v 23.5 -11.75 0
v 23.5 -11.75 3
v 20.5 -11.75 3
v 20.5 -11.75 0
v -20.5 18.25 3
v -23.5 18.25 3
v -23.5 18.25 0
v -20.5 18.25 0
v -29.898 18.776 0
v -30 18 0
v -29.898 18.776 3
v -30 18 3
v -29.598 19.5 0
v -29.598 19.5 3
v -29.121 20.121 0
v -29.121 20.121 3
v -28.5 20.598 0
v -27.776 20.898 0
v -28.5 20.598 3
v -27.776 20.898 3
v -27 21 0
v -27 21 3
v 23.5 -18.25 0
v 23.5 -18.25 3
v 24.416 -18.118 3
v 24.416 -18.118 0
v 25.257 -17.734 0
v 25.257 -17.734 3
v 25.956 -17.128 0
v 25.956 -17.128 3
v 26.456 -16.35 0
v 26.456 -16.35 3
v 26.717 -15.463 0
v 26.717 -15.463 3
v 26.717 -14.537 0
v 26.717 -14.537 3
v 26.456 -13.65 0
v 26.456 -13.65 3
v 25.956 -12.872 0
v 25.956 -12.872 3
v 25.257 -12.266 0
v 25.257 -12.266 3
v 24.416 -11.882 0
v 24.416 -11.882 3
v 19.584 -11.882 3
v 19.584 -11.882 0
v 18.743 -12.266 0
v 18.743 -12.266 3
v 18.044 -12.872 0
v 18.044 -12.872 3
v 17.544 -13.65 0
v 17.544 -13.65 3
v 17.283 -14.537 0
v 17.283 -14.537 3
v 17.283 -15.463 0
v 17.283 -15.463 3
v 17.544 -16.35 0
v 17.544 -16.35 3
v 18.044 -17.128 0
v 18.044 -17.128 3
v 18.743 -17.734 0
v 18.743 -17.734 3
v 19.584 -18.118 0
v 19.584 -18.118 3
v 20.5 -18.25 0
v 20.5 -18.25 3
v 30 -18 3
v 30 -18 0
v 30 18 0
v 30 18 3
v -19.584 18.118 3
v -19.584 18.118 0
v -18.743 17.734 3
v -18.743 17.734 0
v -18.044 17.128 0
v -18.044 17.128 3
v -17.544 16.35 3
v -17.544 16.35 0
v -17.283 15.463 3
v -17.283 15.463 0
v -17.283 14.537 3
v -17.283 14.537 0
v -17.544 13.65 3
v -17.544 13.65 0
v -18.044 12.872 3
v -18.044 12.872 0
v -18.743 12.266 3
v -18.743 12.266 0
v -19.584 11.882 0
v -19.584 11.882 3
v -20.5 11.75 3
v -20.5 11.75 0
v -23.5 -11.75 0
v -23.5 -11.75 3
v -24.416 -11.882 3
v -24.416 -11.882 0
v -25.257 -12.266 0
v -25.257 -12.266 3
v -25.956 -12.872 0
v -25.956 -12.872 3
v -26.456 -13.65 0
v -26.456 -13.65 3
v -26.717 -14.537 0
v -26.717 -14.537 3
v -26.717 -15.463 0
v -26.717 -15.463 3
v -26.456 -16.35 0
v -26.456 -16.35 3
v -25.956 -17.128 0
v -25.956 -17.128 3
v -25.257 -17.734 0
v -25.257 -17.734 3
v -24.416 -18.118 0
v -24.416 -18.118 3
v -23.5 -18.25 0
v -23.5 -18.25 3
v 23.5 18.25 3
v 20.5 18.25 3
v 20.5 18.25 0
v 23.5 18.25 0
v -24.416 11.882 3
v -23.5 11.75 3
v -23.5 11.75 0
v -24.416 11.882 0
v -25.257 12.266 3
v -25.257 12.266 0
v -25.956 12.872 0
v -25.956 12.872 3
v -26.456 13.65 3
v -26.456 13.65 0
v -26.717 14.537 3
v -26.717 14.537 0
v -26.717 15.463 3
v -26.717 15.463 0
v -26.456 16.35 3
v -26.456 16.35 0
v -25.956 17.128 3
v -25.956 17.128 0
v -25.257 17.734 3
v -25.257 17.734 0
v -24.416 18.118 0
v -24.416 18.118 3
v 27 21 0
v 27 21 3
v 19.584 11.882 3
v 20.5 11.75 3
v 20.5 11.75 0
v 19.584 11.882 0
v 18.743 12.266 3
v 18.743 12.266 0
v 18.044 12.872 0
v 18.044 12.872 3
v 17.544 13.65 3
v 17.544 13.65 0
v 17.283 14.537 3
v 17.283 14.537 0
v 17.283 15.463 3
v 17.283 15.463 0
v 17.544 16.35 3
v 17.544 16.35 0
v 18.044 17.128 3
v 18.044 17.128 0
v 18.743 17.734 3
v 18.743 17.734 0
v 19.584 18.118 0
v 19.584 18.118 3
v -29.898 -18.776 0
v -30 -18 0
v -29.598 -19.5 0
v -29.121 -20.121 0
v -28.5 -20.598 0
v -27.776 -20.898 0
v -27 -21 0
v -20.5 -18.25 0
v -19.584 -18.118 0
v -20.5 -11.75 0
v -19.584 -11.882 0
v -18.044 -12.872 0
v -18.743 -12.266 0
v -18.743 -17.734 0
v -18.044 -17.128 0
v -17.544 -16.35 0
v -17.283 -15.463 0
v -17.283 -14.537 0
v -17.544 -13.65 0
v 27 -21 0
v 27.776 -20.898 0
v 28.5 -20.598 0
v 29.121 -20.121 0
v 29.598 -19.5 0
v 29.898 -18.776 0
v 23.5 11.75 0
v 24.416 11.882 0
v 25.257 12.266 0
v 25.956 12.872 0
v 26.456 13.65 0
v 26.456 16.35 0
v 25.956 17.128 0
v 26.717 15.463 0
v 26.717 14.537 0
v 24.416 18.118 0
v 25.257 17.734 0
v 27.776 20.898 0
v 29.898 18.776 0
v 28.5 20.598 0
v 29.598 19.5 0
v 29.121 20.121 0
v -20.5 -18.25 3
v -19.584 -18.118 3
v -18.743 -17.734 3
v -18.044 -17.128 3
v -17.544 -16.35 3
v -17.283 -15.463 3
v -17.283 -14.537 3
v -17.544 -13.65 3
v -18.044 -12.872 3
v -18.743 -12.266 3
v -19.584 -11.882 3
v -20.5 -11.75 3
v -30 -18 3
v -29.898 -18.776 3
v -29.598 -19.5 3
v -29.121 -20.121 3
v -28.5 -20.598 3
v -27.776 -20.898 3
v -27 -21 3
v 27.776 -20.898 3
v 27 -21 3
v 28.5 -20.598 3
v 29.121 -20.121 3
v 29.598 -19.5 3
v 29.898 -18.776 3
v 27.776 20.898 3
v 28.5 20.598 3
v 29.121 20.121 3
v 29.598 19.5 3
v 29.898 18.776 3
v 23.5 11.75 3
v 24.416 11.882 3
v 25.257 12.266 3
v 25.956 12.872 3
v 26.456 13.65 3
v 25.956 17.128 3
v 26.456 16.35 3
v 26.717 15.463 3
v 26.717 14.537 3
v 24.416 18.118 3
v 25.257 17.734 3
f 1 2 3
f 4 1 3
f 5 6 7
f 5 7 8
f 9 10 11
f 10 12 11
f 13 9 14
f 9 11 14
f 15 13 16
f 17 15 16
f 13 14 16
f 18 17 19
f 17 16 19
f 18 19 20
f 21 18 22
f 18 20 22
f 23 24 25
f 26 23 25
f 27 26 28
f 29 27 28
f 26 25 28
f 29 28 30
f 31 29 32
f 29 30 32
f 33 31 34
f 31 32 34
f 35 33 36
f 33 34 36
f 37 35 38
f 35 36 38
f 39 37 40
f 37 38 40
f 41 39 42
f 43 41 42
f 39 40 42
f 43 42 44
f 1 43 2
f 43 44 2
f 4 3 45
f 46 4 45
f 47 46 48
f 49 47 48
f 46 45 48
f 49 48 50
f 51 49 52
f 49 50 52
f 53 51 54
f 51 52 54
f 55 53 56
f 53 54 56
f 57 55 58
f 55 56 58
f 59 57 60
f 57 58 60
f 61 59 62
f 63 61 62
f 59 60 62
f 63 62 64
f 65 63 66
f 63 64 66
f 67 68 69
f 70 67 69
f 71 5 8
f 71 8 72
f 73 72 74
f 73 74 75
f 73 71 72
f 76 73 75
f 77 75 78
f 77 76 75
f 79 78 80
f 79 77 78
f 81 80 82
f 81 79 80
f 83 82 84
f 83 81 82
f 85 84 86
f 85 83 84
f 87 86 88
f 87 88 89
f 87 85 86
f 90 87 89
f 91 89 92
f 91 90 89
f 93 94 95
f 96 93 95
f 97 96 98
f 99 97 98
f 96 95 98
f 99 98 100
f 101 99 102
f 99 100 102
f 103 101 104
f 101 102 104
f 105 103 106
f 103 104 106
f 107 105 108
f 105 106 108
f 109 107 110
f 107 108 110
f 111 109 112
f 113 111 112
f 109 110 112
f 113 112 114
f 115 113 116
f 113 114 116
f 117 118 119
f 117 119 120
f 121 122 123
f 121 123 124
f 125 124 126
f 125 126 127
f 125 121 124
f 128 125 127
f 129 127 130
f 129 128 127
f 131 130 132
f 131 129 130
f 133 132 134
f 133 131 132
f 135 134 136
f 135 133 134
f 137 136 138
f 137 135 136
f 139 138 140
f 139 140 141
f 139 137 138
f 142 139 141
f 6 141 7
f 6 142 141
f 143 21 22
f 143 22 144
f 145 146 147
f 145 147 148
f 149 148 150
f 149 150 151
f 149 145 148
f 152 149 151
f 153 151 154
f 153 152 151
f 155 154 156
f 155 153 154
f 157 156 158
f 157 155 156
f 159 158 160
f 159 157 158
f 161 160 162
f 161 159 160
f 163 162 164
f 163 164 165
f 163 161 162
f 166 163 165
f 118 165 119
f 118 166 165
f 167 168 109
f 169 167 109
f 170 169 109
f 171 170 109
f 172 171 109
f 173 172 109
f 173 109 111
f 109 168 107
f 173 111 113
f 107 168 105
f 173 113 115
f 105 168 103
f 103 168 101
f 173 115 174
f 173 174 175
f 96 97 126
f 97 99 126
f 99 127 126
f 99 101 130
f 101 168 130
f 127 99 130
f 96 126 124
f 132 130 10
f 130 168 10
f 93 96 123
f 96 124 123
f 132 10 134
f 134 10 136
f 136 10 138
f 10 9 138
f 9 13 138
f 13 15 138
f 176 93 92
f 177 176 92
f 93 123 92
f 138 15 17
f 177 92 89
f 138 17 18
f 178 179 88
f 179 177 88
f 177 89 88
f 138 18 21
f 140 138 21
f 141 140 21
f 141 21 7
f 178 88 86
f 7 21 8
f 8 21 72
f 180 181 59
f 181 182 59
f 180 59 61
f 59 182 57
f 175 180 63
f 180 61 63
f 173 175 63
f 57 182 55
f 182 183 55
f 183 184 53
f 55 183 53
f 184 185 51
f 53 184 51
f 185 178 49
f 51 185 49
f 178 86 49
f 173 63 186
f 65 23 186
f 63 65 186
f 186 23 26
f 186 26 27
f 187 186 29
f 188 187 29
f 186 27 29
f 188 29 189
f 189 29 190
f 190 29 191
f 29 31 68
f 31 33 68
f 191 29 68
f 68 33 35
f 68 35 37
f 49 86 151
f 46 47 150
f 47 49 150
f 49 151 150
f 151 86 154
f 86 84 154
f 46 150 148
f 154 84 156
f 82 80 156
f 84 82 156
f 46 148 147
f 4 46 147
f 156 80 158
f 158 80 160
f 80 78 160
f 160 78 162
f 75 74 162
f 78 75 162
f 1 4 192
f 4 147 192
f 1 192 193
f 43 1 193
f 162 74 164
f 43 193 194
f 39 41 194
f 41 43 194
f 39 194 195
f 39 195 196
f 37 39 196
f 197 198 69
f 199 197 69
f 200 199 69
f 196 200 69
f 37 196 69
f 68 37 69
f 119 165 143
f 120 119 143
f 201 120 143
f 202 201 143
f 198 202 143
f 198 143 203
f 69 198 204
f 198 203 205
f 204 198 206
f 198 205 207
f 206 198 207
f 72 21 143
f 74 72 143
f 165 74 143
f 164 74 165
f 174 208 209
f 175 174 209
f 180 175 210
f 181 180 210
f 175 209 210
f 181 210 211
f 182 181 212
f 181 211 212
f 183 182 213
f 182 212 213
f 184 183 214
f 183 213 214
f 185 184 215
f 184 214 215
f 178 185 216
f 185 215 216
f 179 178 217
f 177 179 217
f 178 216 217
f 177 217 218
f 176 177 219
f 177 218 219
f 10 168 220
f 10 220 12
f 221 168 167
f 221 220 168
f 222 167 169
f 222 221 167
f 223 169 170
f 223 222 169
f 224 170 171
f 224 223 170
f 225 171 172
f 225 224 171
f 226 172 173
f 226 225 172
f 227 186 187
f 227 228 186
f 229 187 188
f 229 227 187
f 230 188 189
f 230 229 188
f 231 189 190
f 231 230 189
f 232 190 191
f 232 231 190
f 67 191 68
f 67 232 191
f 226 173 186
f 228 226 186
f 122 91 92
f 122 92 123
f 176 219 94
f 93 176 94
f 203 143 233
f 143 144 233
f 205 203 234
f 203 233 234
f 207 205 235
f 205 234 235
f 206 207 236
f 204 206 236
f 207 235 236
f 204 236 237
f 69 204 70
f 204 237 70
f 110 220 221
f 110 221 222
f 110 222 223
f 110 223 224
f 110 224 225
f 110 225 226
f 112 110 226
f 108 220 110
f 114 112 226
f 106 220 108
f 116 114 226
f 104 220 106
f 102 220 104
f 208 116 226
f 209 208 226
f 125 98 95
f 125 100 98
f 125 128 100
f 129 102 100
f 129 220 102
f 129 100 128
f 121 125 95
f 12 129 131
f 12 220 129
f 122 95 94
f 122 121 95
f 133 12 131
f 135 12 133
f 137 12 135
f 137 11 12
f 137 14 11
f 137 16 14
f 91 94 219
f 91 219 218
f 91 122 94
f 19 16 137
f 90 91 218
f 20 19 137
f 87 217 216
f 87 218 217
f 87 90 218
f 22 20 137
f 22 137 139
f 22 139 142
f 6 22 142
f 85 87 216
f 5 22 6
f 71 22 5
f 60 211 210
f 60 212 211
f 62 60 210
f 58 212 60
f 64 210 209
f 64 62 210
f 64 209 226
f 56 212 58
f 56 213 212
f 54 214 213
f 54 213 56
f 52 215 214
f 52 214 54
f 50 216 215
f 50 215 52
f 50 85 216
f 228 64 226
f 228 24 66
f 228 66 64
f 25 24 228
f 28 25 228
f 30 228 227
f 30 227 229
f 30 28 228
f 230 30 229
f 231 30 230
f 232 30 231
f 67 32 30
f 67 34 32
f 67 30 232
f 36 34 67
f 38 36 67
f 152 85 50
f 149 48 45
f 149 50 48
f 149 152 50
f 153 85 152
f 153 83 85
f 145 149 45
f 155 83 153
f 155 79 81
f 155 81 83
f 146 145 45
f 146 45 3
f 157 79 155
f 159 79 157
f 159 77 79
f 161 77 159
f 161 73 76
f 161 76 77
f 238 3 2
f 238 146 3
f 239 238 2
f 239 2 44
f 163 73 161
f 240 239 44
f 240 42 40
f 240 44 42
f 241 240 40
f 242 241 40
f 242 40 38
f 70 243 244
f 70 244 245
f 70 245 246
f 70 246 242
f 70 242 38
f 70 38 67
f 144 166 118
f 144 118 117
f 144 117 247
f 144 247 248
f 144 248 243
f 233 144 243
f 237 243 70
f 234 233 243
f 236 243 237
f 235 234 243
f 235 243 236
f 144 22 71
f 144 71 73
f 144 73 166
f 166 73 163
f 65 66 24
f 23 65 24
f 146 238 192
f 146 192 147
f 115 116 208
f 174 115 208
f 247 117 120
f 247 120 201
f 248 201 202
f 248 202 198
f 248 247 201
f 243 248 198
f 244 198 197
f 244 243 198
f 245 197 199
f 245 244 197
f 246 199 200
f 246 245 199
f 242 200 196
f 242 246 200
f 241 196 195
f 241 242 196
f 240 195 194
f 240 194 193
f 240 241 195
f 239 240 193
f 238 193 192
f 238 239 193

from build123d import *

# Parameters (mm, degrees)
SKETCH_1_W          = 60
SKETCH_1_H          = 42
EXTRUDE_1_DEPTH     = 3
CUT_EXTRUDE_1_DEPTH = 3
FILLET_1_R          = 3


with BuildPart() as part:
    # 草图1 → 凸台-拉伸1 (new body)
    with BuildSketch(Plane.XY):
        Rectangle(SKETCH_1_W, SKETCH_1_H)
    extrude(amount=EXTRUDE_1_DEPTH)

    # 草图2 → 切除-拉伸1 (cut)
    with BuildSketch(Plane.XY.offset(3)):
        with BuildLine():
            Line((-23.5, 18.25), (-20.5, 18.25))
            ThreePointArc((-20.5, 18.25), (-17.25, 15), (-20.5, 11.75))
            Line((-20.5, 11.75), (-23.5, 11.75))
            ThreePointArc((-23.5, 11.75), (-26.75, 15), (-23.5, 18.25))
        make_face()
        with BuildLine():
            Line((20.5, 18.25), (23.5, 18.25))
            ThreePointArc((23.5, 18.25), (26.75, 15), (23.5, 11.75))
            Line((23.5, 11.75), (20.5, 11.75))
            ThreePointArc((20.5, 11.75), (17.25, 15), (20.5, 18.25))
        make_face()
        with BuildLine():
            Line((20.5, -18.25), (23.5, -18.25))
            ThreePointArc((23.5, -18.25), (26.75, -15), (23.5, -11.75))
            Line((23.5, -11.75), (20.5, -11.75))
            ThreePointArc((20.5, -11.75), (17.25, -15), (20.5, -18.25))
        make_face()
        with BuildLine():
            Line((-23.5, -18.25), (-20.5, -18.25))
            ThreePointArc((-20.5, -18.25), (-17.25, -15), (-20.5, -11.75))
            Line((-20.5, -11.75), (-23.5, -11.75))
            ThreePointArc((-23.5, -11.75), (-26.75, -15), (-23.5, -18.25))
        make_face()
    extrude(amount=-CUT_EXTRUDE_1_DEPTH, mode=Mode.SUBTRACT)

    # 圆角1
    fillet_1_edges = [part.edges().sort_by_distance(p)[0] for p in [
        (-30, 21, 1.5),
        (30, 21, 1.5),
        (30, -21, 1.5),
        (-30, -21, 1.5),
    ]]
    fillet(fillet_1_edges, radius=FILLET_1_R)


solid = part.part
